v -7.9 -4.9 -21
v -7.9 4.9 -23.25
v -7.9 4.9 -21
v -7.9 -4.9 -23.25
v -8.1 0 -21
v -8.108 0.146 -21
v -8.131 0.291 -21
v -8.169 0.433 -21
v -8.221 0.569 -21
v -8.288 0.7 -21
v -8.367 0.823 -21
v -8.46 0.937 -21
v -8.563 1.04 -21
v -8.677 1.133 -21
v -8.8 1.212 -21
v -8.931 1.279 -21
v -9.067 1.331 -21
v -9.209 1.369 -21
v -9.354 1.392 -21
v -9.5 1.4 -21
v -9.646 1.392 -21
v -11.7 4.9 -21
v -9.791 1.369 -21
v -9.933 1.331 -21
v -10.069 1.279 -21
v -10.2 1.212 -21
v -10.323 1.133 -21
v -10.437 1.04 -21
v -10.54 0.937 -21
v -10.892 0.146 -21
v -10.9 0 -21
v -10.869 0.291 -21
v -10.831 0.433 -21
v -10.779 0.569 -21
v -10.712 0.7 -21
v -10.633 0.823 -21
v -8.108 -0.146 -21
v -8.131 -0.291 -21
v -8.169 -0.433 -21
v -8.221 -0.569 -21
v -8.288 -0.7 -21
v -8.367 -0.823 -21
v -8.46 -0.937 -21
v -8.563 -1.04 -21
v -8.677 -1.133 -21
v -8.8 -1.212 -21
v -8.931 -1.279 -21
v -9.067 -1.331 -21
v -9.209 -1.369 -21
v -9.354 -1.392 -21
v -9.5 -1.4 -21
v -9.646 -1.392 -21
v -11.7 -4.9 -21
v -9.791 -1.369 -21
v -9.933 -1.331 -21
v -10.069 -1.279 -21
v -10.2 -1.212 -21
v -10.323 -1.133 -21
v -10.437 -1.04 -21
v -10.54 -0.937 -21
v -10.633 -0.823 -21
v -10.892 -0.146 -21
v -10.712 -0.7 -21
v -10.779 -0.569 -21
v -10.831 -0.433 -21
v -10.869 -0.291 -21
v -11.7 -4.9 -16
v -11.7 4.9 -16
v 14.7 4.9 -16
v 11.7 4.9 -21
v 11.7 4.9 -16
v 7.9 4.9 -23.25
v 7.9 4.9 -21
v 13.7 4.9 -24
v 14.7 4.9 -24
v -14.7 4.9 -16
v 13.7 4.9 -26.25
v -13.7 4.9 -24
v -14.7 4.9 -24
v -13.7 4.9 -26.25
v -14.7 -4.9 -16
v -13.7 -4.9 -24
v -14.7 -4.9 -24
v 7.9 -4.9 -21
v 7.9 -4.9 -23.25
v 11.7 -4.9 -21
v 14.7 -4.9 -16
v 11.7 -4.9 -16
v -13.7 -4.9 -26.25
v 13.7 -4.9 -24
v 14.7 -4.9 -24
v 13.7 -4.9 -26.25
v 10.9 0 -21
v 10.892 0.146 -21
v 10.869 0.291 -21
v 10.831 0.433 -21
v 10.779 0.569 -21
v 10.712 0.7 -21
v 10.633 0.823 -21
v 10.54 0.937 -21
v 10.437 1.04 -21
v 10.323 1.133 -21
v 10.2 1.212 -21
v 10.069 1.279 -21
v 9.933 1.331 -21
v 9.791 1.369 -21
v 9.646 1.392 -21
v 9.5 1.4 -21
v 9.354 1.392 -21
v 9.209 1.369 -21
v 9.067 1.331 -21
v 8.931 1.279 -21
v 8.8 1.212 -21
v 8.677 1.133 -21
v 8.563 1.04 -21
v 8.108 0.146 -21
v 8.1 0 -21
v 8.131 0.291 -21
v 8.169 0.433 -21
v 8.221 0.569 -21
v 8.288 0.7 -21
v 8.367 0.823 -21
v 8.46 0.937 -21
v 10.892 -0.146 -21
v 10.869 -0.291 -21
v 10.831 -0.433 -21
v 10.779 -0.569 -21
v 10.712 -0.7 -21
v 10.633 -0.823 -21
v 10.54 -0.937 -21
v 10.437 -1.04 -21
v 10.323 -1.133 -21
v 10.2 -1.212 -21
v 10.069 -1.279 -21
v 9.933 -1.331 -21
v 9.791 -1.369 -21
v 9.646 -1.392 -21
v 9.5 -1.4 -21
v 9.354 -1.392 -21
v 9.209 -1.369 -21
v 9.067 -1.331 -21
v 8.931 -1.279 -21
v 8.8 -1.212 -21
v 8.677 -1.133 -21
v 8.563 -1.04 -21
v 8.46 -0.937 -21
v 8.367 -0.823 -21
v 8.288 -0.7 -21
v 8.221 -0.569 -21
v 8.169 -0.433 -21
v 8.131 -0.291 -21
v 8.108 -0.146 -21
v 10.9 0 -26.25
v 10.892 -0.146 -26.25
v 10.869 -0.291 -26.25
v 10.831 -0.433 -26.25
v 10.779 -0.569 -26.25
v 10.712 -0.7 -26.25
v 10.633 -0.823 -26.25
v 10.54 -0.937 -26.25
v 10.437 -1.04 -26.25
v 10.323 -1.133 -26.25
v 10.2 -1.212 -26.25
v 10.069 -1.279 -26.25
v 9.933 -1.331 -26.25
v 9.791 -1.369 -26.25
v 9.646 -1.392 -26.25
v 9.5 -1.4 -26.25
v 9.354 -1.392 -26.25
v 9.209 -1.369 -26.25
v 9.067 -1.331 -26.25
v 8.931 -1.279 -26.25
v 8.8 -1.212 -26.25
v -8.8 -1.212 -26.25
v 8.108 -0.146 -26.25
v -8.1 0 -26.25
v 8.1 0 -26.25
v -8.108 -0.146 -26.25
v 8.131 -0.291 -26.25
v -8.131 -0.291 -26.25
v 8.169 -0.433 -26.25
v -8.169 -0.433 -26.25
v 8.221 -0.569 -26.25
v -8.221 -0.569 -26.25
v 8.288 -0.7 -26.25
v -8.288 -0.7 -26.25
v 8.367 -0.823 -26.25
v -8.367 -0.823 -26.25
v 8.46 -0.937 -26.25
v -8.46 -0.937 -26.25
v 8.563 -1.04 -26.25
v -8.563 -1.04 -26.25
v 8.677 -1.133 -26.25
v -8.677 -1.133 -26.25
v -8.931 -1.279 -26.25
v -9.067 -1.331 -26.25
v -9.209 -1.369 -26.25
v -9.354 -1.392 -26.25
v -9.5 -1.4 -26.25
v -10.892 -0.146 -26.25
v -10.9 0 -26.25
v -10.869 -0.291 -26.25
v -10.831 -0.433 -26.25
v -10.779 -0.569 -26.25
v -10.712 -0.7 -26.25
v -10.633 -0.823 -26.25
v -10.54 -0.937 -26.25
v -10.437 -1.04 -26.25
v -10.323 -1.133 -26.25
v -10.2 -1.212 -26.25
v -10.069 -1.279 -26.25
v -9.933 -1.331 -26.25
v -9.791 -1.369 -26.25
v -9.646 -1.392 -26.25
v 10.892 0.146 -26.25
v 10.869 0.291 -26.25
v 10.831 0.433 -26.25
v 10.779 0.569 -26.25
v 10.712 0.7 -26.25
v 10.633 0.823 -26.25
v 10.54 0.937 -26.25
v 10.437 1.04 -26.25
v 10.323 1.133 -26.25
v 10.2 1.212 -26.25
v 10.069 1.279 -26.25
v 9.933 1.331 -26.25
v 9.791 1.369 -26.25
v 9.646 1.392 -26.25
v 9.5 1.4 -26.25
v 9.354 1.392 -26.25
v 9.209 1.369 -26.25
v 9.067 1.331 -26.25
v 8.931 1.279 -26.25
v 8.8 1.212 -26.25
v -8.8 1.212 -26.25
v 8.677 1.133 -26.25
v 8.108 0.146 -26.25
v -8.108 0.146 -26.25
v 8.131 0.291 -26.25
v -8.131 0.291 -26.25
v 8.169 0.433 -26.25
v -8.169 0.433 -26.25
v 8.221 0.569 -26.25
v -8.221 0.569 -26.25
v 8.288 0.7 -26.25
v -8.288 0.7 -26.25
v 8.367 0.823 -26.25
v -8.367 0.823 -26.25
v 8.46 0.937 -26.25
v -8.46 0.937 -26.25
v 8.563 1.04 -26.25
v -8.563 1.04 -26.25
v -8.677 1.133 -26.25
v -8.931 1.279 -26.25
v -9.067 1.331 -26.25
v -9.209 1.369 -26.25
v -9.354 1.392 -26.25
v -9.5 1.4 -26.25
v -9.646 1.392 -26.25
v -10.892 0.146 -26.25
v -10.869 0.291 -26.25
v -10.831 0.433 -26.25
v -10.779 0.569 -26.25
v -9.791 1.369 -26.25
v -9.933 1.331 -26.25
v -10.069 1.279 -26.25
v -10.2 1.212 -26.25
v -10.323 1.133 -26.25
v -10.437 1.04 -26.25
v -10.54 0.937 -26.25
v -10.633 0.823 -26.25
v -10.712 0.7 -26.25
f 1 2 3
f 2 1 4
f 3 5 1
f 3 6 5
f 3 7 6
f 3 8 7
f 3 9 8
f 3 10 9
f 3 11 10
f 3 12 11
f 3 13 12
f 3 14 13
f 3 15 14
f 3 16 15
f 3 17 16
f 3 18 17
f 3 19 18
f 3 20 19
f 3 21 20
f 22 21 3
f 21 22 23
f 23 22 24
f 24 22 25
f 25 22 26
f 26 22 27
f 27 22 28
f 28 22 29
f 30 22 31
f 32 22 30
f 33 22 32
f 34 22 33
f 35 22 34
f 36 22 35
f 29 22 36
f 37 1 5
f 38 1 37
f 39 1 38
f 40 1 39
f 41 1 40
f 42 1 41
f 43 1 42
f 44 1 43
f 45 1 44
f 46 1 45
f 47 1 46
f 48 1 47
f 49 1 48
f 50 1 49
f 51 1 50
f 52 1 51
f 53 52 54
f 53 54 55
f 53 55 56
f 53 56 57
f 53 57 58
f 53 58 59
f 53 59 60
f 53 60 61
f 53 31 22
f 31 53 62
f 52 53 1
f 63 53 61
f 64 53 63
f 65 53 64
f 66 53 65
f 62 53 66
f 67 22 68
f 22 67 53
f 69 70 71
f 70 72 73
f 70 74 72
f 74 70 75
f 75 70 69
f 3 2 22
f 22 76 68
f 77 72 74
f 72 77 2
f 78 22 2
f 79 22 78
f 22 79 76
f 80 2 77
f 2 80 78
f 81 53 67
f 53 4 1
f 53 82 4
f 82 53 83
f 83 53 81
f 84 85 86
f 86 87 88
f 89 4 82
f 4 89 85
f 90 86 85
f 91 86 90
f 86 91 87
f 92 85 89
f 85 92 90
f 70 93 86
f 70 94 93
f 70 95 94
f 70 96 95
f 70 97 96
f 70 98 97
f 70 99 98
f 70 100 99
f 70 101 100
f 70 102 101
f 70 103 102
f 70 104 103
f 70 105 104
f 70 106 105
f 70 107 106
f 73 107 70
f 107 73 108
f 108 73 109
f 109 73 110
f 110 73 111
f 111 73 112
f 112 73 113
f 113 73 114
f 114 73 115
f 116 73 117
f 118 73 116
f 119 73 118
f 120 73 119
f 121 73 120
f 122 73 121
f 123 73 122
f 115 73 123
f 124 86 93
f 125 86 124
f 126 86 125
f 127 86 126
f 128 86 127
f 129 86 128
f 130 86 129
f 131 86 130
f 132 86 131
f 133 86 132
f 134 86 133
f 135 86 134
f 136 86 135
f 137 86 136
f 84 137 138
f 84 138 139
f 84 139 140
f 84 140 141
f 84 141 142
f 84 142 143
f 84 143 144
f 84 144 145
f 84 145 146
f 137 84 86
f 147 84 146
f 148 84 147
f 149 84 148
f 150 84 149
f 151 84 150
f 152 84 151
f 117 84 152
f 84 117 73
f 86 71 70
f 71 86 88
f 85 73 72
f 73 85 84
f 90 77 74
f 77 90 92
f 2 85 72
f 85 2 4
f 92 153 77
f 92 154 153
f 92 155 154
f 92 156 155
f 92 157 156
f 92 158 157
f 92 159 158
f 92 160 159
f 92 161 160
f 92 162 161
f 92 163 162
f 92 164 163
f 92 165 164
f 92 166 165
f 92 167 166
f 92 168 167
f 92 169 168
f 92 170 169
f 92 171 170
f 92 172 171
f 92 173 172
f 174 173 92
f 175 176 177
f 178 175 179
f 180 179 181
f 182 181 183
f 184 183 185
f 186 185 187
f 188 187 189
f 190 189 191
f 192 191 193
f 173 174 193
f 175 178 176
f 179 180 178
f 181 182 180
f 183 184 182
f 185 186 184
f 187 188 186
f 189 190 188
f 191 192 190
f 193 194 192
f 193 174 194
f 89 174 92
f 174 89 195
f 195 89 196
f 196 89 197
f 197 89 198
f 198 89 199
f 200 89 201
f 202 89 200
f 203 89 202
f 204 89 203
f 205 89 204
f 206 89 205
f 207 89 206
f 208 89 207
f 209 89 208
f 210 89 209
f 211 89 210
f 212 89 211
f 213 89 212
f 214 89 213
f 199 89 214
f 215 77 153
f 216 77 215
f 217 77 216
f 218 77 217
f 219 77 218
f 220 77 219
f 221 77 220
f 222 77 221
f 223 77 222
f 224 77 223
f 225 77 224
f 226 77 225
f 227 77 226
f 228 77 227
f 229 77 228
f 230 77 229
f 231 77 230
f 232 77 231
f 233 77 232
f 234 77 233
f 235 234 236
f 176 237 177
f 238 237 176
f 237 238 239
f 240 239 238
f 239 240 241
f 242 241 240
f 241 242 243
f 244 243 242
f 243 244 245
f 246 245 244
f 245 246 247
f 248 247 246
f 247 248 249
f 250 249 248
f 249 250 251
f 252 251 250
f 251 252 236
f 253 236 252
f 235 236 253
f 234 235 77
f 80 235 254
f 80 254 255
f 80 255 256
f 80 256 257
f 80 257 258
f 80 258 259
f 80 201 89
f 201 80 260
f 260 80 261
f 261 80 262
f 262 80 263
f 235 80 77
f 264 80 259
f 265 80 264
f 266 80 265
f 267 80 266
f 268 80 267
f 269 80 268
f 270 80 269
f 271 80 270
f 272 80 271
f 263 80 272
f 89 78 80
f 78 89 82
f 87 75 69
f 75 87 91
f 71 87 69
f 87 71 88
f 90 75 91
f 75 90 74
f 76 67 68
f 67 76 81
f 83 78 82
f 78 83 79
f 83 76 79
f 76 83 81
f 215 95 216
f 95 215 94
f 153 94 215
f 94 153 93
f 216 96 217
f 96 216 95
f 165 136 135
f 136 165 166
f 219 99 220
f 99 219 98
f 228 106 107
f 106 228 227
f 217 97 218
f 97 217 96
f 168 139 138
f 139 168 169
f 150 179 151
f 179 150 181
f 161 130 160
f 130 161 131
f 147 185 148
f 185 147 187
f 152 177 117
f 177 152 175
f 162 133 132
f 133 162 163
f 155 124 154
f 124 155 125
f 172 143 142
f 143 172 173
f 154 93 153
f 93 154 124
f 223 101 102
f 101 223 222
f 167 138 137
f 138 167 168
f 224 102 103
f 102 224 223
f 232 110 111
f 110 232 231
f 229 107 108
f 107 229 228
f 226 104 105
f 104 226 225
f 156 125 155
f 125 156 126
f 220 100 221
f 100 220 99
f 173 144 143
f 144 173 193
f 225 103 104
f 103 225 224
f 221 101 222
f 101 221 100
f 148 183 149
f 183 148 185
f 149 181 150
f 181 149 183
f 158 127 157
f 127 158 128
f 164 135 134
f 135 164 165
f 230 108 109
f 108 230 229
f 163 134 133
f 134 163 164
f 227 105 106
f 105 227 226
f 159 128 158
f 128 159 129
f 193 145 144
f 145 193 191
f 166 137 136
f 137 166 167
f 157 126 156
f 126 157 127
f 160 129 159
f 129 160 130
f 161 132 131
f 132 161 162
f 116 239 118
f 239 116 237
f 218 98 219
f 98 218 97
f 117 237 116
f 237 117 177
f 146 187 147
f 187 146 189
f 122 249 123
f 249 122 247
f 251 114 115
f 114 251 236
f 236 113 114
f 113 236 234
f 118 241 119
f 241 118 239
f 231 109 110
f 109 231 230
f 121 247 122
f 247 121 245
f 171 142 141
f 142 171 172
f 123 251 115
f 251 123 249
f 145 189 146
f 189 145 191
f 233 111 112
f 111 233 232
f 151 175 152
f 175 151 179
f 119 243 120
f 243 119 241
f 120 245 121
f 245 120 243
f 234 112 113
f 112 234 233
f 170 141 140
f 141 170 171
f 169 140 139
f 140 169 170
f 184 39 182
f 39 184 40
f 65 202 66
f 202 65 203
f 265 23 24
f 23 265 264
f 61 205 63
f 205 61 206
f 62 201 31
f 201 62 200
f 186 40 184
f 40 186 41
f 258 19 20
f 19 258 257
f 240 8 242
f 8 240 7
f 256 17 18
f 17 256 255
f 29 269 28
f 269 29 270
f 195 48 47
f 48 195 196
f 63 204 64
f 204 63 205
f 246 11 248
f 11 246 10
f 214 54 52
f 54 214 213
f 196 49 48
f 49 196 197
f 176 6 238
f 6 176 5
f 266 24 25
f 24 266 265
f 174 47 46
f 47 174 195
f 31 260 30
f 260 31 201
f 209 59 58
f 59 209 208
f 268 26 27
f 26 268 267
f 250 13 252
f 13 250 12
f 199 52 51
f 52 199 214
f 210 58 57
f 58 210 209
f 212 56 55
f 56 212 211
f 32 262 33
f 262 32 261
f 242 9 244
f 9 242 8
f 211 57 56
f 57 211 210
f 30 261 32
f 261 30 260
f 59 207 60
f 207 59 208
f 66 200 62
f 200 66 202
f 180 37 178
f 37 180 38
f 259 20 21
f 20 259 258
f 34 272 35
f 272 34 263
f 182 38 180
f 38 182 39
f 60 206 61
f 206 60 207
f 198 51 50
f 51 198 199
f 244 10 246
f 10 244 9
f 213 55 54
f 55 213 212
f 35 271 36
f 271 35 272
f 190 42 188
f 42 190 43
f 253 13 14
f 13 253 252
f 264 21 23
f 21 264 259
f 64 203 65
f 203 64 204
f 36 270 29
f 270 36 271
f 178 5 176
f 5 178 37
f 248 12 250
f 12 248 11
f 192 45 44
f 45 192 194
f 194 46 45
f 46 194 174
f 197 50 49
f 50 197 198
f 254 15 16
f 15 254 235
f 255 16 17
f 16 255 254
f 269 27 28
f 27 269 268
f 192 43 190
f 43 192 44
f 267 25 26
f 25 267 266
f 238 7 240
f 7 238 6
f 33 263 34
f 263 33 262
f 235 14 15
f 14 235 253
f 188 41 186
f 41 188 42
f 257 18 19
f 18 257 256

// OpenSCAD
// file: keycap.scad
/* support for models of keycaps in various profiles
 * and placement functions for orienting keycaps "flat", i.e. perpendicular to the positive Z axis and centered in XY
 */


include <settings.scad>;

//include <../KeyV2/includes.scad> // you can ignore this warning if prerendered_keycaps is true

module keycap(row=3, travel_advisory=true, override_profile=false) {
  // KeyV2 will warn for an unsupported profile. good enough?
  //assert(profile=="cherry"||profile="sa", "unrecognized keycap profile");

  if ($preview || ! disable_keycap_render()) {
    if (is_string(row)) {
      // XXX separate modules for nav caps (and encoders)?
      if (row == "SKRH") {
	cap_len=5;
	color("red", .2) {
	  cylinder(d=6.4,h=cap_len-1);
	  translate([0,0,(cap_len-1)]) cylinder(d=8,h=1);
	}
      }
    } else {

      use_profile = override_profile == false ? profile : override_profile;

      effective_row = (row >= 5) ? 5 : ((row < 1) ? 1 : row);


      show_travel()
	if (prerendered_keycaps()) {
	  import(str("key-cache","/",use_profile,"/",row,".stl"));
	} else {
	  blank() key_profile(use_profile, effective_row)
	    if ($preview && fast_keycap_preview()) {
	      key($fn=6);
	    } else if (! $preview&& fast_keycap_render()) {
	      key($fn=60);
	    } else {
	      key();
	    }
	}
    }
  }
  module show_travel() {
    how_low = switch_travel;
    children();
    if (travel_advisory && $preview) {
      color("yellow", 0.25) translate([0,0,-how_low]) linear_extrude(how_low) projection() children();
    }
  }
}


module cherry_position_flat(row) {
  assert(row > 0 && row < 5 );

  if (row == 1) {
    translate([0,-2.032,-9.2]) rotate([0,0,0]) children();
  } else if (row == 2) {
    translate([0,-1.71,-6.93]) rotate([2.5,0,0]) children();
  } else if (row == 3) {
    translate([0,-1.47,-6.1]) rotate([5,0,0]) children();
  } else { // if (row == 4) {
    translate([0,-.615,-7.011]) rotate([11.5,0,0]) children();
  }
}

/* use this to dial in *_position_flat() for each row
 *  first lower the Z height of the switch until the origin sits on its top face
 *  next adjust rotation, using a side view, until the top face of the switch is level. then you may need to go back
 *   and tweak the Z. raise the keycap until the X and Y axes and scale markers disappear, then lower until they
 *   just become visible, using at least 2 decimal digits
 *  finally, select a top view and then lower the Y to center the origin on the top face
 */
let(row=1,prof="cherry") {
  position_flat(row,override_profile=prof) keycap($fast_keycap_preview=true, $prerendered_keycaps=false, row, override_profile=prof);
}


// wish I had macros right about now ;)
module position_flat(row, override_profile=false) {
  use_profile = override_profile == false ? profile : override_profile;

  // strings override global profile row numbers
  if (is_string(row) && row == "SKRH") {
    // XXX should navcaps have custom *_position_flat() modules?
    translate ([0,0,-5+1]) children();
  } else if (use_profile == "cherry") {
    cherry_position_flat(row) children();
  } else if (use_profile == "sa") {
    sa_position_flat(row) children();
  } else if (use_profile == "dsa") {
    dsa_position_flat(row) children();
  } else if (use_profile == "oem") {
    oem_position_flat(row) children();
  } else if (use_profile == "dcs") {
    dcs_position_flat(row) children();
  } else if (use_profile == "g20") {
    g20_position_flat(row) children();
  } else if (use_profile == "dss") {
    dss_position_flat(row) children();
  } else if (use_profile == "hipro") {
    hipro_position_flat(row) children();
  } else if (use_profile == "grid") {
    grid_position_flat(row) children();
  } else {
    assert(false, "unknown keycap profile");
  }
}

/* most keycap profiles have 4 (cherry) or 5 distinct rows, and double up the top and bottom row if needed.
 *  (some profiles count bottom up, rather than top down, we always count top down, as does KeyV2, I believe)
 * this is a rough heuristic to use to meet the following common cases:
 *  - alphas only, "30%"ish; 3 rows with homerow as 1 (counting from 0): R2, *R3, R4
 *  - alphas and symbols/mods below, "40%"ish; 4 rows with homerow as 1: R2, *R3, R4, R5
 *  - alphanumeric, "60%"ish; 4 rows with homerow as 2 :  R1, R2, *R3, R4
 *  - alphanumeric+function keys, "TKL"; 5 rows with homerow as 3 : R1, R1, R2, *R3, R4
 *  - alphanumeric and symbols/mods below, "ergodox"; 5 rows with homerow as 2 : R1, R2, *R3, R4, R5
 *  - alphanumeric+function keys and symbols/mods below; 6 rows with homerow as 3 : R1, R1, R2, *R3, R4, R5
 *
 *  rather than shoehorning other layouts in, it's reccomended to define a new function
 *   and pass it as a function literal to effective_rows()
 */
function effective_row(row,maxrows=4,homerow=2,col=0) =
  let (effective = 3 + (row - (homerow+1)))
  profile == "dsa" || profile == "g20" ? 1 :
  profile == "cherry" && effective > 4 ? 4 :
  effective > 5 ? 5 :
  effective < 1 ? 1 :
  effective;


/* make a vector of the appropriate keycap profile row for each key row of a full column
 *  for something like SA R3, where only a single row of the profile is used for all keys,
 *  just pass the number 3 instead of using this function to make a vector
 */
function effective_rows(maxrows=4, homerow=2, func=function (r,m,h) effective_row(r,m,h)) =
  profile == "dsa" || profile == "g20" ? 1 :
  [ for(i=[1:maxrows]) func(i, maxrows, homerow) ];

//echo(effective_rows(4,3, function (r,m,h) effective_row(r,m,h)));
// file: settings.scad
/* keycaps */
_profile = "cherry";

// the height of the bottom of the keycap over the key_mount.
// a property of the keycap but I couldn't think fo a better name.
// shouldn't need to override this directly, but you can.
//_stem_height = 6.1;

// keycap render settings

/* Pre-rendered keycaps are recommended as they should be much faster, and remove the dependency on KeyV2.
 * However they lose the distinctive coloring. Also, pre-renders may be missing. Used in both previews and renders.
 */
_prerendered_keycaps = true;

// if not pre-rendering, these options turn down the fidelity so that previews/renders don't take so long
_fast_keycap_preview = true;
_fast_keycap_render = false;

// don't show keycaps in renders. we don't want keys when 3D printing, also they block the view and can be slow
_disable_keycap_render = true;


/* keyswitch */
// switch style is "mx", "choc".
// can be inferred from profile
//_switch_style= "choc";

// if using mx switches, are they speed switches (lower travel)?
//_mx_speed = true;

// how far the key switch can depress (only for visual indication, doesn't affect the keyboard)
// can be inferred from switch type
//_switch_travel = 4.0;


/* key_mount parameters */
// innerdia is the (square) hole for the switch
// outerdia is the the minimum structural support
_mx_innerdia = 13.9;
_mx_outerdia = 17;

_choc_innerdia = _mx_innerdia;
_choc_outerdia = 15.5;

// key plate thickness
// can be inferred from switch type
//_thickness=4; // blanket override... probably unnecessary

_mx_thickness = 4;
_choc_thickness = 3;

// MX cutout params
function mx_tab_offset() = 1.2; // how far from the top the switchholders start
function mx_tab_depth() = 0.6; // how far tabs stick out
function mx_tab_width() = 5;

_epsilon = .001; // smallest meaningful overlap, used when avoiding coincident faces

// the footprint of the keycaps.
// defines how close key_mounts can be, but mostly used for outer perimeters.
_mx_min_spacing = 18.4;
_choc_min_spacing = 18;

// how much room we need for switchpins, hotswaps, etc.
// used to cut into trackpoint mount supports
function switch_clearance() = 3;


/* side wall width */
_wall_width=2.5;

// extra space between the key mount and an ajoining wall, in x and y
_wall_extra_room = [0,0]; //[5,3];


// bounds
//highest_high=40;
//XXX  eliminate by placing bottom of plate at Z=0
function lowest_low() = 60;

// Do Not Edit Below This Line

function profile(override) =
  !is_undef(override) ? override :
  !is_undef($profile) ? $profile :
  _profile;

function profile_is_uniform() =
  profile() == "dsa" || profile() == "g20" || profile() == "lpx";


function stem_height() =
  !is_undef($stem_height) ? $stem_height :
  !is_undef(_stem_height) ? _stem_height :
  profile() == "cherry" ? 6.1 :
  profile() == "sa" ? 6.8 :
  profile() == "lpx" ? 5 :
  assert(false, "unrecognized keycap profile");


function prerendered_keycaps() = !is_undef($prerendered_keycaps) ? $prerendered_keycaps : _prerendered_keycaps;
function fast_keycap_preview() = !is_undef($fast_keycap_preview) ? $fast_keycap_preview : _fast_keycap_preview;
function fast_keycap_render() = !is_undef($fast_keycap_render) ? $fast_keycap_render : _fast_keycap_render;
function disable_keycap_render() = !is_undef($disable_keycap_render) ? $disable_keycap_render : _disable_keycap_render;

function switch_type() =
  !is_undef($switch_type) ? $switch_type :
  !is_undef(_switch_type) ? _switch_type :
  profile() == "lpx" || profile() == "mbk" || profile() == "cs" || profile() == "mcc" ? "choc" :
  profile() == "cherry" || profile() == "sa" || profile() == "dsa" || profile() == "g20" ? "mx" :
  assert(false, str("unknown profile '", profile(), "' cannot deduce switch_type"));

function mx_speed() =
  !is_undef($mx_speed) ? $mx_speed :
  !is_undef(_mx_speed) && _mx_speed;

function switch_travel() =
  !is_undef($switch_travel) ? $switch_travel :
  !is_undef(_switch_travel) ? _switch_travel :
  switch_type() == "mx" ? mx_speed() ? 3.5 : 4.0 :
  switch_type() == "choc" ? 3.0 :
  assert(false, str("unknown switch_type '", switch_type()));

function innerdia() =
  !is_undef($innerdia) ? $innerdia :
  switch_type() == "mx" && !is_undef(_mx_innerdia) ? _mx_innerdia :
  switch_type() == "choc" && !is_undef(_choc_innerdia) ? _choc_innerdia :
  assert(false, str("please define an innerdia for: ", switch_type()));

function outerdia() =
  !is_undef($outerdia) ? $outerdia :
  switch_type() == "mx" && !is_undef(_mx_outerdia) ? _mx_outerdia :
  switch_type() == "choc" && !is_undef(_choc_outerdia) ? _choc_outerdia :
  assert(false, str("please define an outerdia for: ", switch_type()));

function spacer() =
  !is_undef($spacer) ? $spacer :
  switch_type() == "mx" ? _mx_min_spacing - outerdia() :
  switch_type() == "choc" ? _choc_min_spacing - outerdia() :
  assert(false, str("please define an spacer for: ", switch_type(), " or: ", profile()));

function thickness() =
  !is_undef($thickness) ? $thickness :
  !is_undef(_thickness) ? _thickness :
  switch_type() == "mx" ? _mx_thickness :
  switch_type() == "choc" ? _choc_thickness :
  assert(false, "please define a key plate thickness");

function wall_width() =
  !is_undef($wall_width) ? $wall_width :
  !is_undef(_wall_width) ? _wall_width :
  assert(false, "please defined a wall_width");

function wall_extra_room() =
  !is_undef($wall_extra_room) ? $wall_extra_room :
  !is_undef(_wall_extra_room) ?
  !is_list(_wall_extra_room) ? [_wall_extra_room, _wall_extra_room]
  : _wall_extra_room :
  [0,0];


function epsilon() =
  !is_undef($epsilon) ? $epsilon :
  !is_undef(_epsilon) ? _epsilon :
  assert(false, "please define an _epsilon value");
// main file
include <settings.scad>;
use <util.scad>;
use <column-util.scad>;
use <keywell.scad>;
use <keycap.scad>;


module install_trackpoint(row,col, row_spacing, col_spacing, profile_rows, homerow,
			  h1=4,h2=4, stem=0,up=0,tilt, displacement=[0,0,0], params=default_layout_placement_params(), square_hole=false, access=true,w1=0,w2=0, use_shield=false, shield=[4,11,12.3], shield_angle=[-65,-5]) {
  module helper(row, col, corners=false, d=displacement) {
    layout_placement(row,col, row_spacing, col_spacing, profile_rows=profile_rows, homerow=homerow, tilt=tilt,displacement=d,params=params, corners=corners, flatten=!corners) children();
  }

  // visualize trackpoint
  helper(row,col,corners=true) trackpoint_mount($fn=60, h1, h2, stem, up, tilt, stemonly=true);

  // cutting holes in case
  difference() {
    union() {
      children();

      difference() {
	helper(row,col,corners=true) trackpoint_mount($fn=60, h1, h2, stem, up, tilt, w1=w1,w2=w2);

	// remove any material that might interfere with adjacent key switches
	above=true;
	for (i=[0,1]) {
	  for (j=[0,1]) {
	    helper(row+i,col+j,d=[0,0,0]) keywell_cavity(above=above,below=true);
	  }
	}
      }

      if (use_shield) {
	helper(row,col,corners=true) translate([0,0,-shield.z]) if (square_hole) {
	  //cube([7,7,stem_h*2],true);
	} else {
	  difference() {
	    cylinder($fn=120,d=13+shield.x*2,h=shield.y);
	    rotate([0,0,shield_angle[0]]) translate([-50,0,-0.1]) cube([100,100,shield.y*2]);
	    rotate([0,0,shield_angle[1]]) translate([-50,0,-0.1]) cube([100,100,shield.y*2]);
	  }
	}
      }
    }

    // trackpoint stem hole
    stem_h=5+stem+16;
    helper(row,col,corners=true) translate([0,0,-stem_h]) if (square_hole) {
      cube([7,7,stem_h*2],true);
    } else {
      cylinder($fn=60,d=15,h=stem_h*2,center=true);
    }

    if (access) {
      // screw holes for attaching stem extension
      access_dia=5;
      helper(row,col,corners=true) translate([0,0,-(21+stem-access_dia/2)]) rotate([0,90,0]) cylinder($fn=60,d=access_dia,h=100,center=true);
    }
  }
}

module trackpoint_cap() {

}

module trackpoint_mount(h1,h2,stem=0,up=0,tilt=[-5,0,0], bottom=false, stemonly=false, w1=0,w2=0){
  width=23+.4;
  depth=9.8;
  flange_z=3;


  cap_len = 5;

  tp_depth = 16+stem+ cap_len;
  stem_depth = 0;
  stem_len = 16+stem+up+stem_depth;

  translate([0,0,-tp_depth]) {
    if (stemonly) {
      echo(str("you need a ",stem_len," mm stem"));

      color("red",.2) if ($preview) {
	union(){
	  cylinder(d=11,h=4.5);
	  translate([0,0,stem_depth]) cylinder(d=4,h=stem_len);
	  translate([0,0,stem_depth+stem_len]) cylinder(d=6.4,h=cap_len-1);
	  translate([0,0,stem_depth+(cap_len-1)+stem_len]) cylinder(d=8,h=1);
	}
      }
    } else {
      difference(){
	union() {
	  // mount flanges
	  let(x=3.8,y=depth,z=flange_z) {
	    translate([-width/2-w2,-y/2,-z]) cube([x+w2,y,z]);
	    mirror([1,0,0]) translate([-width/2-w1,-y/2,-z]) cube([x+w1,y,z]);
	    if (bottom){
	      translate([0,0,-5*z/4])cube([width+4,y,z],center=true);
	    }
	  }

	  // verticals
	  let(x=flange_z,y=depth,z=flange_z) {
	    translate([width/2+w1,-y/2,-z]) cube([x,y,h1+z]);
	    mirror([1,0,0]) translate([width/2+w2,-y/2,-z]) cube([x,y,h2+z]);
	  }
	}

	//screw holes
	let(h=flange_z*5,d=2.5,slop=.3) {
	  rotational_clone() translate([19/2,0,-h/2])cylinder(h=h,d=d+slop);
	}
      }
    }
  }
}

trackpoint_mount($fn=60,5,5,bottom=true);
